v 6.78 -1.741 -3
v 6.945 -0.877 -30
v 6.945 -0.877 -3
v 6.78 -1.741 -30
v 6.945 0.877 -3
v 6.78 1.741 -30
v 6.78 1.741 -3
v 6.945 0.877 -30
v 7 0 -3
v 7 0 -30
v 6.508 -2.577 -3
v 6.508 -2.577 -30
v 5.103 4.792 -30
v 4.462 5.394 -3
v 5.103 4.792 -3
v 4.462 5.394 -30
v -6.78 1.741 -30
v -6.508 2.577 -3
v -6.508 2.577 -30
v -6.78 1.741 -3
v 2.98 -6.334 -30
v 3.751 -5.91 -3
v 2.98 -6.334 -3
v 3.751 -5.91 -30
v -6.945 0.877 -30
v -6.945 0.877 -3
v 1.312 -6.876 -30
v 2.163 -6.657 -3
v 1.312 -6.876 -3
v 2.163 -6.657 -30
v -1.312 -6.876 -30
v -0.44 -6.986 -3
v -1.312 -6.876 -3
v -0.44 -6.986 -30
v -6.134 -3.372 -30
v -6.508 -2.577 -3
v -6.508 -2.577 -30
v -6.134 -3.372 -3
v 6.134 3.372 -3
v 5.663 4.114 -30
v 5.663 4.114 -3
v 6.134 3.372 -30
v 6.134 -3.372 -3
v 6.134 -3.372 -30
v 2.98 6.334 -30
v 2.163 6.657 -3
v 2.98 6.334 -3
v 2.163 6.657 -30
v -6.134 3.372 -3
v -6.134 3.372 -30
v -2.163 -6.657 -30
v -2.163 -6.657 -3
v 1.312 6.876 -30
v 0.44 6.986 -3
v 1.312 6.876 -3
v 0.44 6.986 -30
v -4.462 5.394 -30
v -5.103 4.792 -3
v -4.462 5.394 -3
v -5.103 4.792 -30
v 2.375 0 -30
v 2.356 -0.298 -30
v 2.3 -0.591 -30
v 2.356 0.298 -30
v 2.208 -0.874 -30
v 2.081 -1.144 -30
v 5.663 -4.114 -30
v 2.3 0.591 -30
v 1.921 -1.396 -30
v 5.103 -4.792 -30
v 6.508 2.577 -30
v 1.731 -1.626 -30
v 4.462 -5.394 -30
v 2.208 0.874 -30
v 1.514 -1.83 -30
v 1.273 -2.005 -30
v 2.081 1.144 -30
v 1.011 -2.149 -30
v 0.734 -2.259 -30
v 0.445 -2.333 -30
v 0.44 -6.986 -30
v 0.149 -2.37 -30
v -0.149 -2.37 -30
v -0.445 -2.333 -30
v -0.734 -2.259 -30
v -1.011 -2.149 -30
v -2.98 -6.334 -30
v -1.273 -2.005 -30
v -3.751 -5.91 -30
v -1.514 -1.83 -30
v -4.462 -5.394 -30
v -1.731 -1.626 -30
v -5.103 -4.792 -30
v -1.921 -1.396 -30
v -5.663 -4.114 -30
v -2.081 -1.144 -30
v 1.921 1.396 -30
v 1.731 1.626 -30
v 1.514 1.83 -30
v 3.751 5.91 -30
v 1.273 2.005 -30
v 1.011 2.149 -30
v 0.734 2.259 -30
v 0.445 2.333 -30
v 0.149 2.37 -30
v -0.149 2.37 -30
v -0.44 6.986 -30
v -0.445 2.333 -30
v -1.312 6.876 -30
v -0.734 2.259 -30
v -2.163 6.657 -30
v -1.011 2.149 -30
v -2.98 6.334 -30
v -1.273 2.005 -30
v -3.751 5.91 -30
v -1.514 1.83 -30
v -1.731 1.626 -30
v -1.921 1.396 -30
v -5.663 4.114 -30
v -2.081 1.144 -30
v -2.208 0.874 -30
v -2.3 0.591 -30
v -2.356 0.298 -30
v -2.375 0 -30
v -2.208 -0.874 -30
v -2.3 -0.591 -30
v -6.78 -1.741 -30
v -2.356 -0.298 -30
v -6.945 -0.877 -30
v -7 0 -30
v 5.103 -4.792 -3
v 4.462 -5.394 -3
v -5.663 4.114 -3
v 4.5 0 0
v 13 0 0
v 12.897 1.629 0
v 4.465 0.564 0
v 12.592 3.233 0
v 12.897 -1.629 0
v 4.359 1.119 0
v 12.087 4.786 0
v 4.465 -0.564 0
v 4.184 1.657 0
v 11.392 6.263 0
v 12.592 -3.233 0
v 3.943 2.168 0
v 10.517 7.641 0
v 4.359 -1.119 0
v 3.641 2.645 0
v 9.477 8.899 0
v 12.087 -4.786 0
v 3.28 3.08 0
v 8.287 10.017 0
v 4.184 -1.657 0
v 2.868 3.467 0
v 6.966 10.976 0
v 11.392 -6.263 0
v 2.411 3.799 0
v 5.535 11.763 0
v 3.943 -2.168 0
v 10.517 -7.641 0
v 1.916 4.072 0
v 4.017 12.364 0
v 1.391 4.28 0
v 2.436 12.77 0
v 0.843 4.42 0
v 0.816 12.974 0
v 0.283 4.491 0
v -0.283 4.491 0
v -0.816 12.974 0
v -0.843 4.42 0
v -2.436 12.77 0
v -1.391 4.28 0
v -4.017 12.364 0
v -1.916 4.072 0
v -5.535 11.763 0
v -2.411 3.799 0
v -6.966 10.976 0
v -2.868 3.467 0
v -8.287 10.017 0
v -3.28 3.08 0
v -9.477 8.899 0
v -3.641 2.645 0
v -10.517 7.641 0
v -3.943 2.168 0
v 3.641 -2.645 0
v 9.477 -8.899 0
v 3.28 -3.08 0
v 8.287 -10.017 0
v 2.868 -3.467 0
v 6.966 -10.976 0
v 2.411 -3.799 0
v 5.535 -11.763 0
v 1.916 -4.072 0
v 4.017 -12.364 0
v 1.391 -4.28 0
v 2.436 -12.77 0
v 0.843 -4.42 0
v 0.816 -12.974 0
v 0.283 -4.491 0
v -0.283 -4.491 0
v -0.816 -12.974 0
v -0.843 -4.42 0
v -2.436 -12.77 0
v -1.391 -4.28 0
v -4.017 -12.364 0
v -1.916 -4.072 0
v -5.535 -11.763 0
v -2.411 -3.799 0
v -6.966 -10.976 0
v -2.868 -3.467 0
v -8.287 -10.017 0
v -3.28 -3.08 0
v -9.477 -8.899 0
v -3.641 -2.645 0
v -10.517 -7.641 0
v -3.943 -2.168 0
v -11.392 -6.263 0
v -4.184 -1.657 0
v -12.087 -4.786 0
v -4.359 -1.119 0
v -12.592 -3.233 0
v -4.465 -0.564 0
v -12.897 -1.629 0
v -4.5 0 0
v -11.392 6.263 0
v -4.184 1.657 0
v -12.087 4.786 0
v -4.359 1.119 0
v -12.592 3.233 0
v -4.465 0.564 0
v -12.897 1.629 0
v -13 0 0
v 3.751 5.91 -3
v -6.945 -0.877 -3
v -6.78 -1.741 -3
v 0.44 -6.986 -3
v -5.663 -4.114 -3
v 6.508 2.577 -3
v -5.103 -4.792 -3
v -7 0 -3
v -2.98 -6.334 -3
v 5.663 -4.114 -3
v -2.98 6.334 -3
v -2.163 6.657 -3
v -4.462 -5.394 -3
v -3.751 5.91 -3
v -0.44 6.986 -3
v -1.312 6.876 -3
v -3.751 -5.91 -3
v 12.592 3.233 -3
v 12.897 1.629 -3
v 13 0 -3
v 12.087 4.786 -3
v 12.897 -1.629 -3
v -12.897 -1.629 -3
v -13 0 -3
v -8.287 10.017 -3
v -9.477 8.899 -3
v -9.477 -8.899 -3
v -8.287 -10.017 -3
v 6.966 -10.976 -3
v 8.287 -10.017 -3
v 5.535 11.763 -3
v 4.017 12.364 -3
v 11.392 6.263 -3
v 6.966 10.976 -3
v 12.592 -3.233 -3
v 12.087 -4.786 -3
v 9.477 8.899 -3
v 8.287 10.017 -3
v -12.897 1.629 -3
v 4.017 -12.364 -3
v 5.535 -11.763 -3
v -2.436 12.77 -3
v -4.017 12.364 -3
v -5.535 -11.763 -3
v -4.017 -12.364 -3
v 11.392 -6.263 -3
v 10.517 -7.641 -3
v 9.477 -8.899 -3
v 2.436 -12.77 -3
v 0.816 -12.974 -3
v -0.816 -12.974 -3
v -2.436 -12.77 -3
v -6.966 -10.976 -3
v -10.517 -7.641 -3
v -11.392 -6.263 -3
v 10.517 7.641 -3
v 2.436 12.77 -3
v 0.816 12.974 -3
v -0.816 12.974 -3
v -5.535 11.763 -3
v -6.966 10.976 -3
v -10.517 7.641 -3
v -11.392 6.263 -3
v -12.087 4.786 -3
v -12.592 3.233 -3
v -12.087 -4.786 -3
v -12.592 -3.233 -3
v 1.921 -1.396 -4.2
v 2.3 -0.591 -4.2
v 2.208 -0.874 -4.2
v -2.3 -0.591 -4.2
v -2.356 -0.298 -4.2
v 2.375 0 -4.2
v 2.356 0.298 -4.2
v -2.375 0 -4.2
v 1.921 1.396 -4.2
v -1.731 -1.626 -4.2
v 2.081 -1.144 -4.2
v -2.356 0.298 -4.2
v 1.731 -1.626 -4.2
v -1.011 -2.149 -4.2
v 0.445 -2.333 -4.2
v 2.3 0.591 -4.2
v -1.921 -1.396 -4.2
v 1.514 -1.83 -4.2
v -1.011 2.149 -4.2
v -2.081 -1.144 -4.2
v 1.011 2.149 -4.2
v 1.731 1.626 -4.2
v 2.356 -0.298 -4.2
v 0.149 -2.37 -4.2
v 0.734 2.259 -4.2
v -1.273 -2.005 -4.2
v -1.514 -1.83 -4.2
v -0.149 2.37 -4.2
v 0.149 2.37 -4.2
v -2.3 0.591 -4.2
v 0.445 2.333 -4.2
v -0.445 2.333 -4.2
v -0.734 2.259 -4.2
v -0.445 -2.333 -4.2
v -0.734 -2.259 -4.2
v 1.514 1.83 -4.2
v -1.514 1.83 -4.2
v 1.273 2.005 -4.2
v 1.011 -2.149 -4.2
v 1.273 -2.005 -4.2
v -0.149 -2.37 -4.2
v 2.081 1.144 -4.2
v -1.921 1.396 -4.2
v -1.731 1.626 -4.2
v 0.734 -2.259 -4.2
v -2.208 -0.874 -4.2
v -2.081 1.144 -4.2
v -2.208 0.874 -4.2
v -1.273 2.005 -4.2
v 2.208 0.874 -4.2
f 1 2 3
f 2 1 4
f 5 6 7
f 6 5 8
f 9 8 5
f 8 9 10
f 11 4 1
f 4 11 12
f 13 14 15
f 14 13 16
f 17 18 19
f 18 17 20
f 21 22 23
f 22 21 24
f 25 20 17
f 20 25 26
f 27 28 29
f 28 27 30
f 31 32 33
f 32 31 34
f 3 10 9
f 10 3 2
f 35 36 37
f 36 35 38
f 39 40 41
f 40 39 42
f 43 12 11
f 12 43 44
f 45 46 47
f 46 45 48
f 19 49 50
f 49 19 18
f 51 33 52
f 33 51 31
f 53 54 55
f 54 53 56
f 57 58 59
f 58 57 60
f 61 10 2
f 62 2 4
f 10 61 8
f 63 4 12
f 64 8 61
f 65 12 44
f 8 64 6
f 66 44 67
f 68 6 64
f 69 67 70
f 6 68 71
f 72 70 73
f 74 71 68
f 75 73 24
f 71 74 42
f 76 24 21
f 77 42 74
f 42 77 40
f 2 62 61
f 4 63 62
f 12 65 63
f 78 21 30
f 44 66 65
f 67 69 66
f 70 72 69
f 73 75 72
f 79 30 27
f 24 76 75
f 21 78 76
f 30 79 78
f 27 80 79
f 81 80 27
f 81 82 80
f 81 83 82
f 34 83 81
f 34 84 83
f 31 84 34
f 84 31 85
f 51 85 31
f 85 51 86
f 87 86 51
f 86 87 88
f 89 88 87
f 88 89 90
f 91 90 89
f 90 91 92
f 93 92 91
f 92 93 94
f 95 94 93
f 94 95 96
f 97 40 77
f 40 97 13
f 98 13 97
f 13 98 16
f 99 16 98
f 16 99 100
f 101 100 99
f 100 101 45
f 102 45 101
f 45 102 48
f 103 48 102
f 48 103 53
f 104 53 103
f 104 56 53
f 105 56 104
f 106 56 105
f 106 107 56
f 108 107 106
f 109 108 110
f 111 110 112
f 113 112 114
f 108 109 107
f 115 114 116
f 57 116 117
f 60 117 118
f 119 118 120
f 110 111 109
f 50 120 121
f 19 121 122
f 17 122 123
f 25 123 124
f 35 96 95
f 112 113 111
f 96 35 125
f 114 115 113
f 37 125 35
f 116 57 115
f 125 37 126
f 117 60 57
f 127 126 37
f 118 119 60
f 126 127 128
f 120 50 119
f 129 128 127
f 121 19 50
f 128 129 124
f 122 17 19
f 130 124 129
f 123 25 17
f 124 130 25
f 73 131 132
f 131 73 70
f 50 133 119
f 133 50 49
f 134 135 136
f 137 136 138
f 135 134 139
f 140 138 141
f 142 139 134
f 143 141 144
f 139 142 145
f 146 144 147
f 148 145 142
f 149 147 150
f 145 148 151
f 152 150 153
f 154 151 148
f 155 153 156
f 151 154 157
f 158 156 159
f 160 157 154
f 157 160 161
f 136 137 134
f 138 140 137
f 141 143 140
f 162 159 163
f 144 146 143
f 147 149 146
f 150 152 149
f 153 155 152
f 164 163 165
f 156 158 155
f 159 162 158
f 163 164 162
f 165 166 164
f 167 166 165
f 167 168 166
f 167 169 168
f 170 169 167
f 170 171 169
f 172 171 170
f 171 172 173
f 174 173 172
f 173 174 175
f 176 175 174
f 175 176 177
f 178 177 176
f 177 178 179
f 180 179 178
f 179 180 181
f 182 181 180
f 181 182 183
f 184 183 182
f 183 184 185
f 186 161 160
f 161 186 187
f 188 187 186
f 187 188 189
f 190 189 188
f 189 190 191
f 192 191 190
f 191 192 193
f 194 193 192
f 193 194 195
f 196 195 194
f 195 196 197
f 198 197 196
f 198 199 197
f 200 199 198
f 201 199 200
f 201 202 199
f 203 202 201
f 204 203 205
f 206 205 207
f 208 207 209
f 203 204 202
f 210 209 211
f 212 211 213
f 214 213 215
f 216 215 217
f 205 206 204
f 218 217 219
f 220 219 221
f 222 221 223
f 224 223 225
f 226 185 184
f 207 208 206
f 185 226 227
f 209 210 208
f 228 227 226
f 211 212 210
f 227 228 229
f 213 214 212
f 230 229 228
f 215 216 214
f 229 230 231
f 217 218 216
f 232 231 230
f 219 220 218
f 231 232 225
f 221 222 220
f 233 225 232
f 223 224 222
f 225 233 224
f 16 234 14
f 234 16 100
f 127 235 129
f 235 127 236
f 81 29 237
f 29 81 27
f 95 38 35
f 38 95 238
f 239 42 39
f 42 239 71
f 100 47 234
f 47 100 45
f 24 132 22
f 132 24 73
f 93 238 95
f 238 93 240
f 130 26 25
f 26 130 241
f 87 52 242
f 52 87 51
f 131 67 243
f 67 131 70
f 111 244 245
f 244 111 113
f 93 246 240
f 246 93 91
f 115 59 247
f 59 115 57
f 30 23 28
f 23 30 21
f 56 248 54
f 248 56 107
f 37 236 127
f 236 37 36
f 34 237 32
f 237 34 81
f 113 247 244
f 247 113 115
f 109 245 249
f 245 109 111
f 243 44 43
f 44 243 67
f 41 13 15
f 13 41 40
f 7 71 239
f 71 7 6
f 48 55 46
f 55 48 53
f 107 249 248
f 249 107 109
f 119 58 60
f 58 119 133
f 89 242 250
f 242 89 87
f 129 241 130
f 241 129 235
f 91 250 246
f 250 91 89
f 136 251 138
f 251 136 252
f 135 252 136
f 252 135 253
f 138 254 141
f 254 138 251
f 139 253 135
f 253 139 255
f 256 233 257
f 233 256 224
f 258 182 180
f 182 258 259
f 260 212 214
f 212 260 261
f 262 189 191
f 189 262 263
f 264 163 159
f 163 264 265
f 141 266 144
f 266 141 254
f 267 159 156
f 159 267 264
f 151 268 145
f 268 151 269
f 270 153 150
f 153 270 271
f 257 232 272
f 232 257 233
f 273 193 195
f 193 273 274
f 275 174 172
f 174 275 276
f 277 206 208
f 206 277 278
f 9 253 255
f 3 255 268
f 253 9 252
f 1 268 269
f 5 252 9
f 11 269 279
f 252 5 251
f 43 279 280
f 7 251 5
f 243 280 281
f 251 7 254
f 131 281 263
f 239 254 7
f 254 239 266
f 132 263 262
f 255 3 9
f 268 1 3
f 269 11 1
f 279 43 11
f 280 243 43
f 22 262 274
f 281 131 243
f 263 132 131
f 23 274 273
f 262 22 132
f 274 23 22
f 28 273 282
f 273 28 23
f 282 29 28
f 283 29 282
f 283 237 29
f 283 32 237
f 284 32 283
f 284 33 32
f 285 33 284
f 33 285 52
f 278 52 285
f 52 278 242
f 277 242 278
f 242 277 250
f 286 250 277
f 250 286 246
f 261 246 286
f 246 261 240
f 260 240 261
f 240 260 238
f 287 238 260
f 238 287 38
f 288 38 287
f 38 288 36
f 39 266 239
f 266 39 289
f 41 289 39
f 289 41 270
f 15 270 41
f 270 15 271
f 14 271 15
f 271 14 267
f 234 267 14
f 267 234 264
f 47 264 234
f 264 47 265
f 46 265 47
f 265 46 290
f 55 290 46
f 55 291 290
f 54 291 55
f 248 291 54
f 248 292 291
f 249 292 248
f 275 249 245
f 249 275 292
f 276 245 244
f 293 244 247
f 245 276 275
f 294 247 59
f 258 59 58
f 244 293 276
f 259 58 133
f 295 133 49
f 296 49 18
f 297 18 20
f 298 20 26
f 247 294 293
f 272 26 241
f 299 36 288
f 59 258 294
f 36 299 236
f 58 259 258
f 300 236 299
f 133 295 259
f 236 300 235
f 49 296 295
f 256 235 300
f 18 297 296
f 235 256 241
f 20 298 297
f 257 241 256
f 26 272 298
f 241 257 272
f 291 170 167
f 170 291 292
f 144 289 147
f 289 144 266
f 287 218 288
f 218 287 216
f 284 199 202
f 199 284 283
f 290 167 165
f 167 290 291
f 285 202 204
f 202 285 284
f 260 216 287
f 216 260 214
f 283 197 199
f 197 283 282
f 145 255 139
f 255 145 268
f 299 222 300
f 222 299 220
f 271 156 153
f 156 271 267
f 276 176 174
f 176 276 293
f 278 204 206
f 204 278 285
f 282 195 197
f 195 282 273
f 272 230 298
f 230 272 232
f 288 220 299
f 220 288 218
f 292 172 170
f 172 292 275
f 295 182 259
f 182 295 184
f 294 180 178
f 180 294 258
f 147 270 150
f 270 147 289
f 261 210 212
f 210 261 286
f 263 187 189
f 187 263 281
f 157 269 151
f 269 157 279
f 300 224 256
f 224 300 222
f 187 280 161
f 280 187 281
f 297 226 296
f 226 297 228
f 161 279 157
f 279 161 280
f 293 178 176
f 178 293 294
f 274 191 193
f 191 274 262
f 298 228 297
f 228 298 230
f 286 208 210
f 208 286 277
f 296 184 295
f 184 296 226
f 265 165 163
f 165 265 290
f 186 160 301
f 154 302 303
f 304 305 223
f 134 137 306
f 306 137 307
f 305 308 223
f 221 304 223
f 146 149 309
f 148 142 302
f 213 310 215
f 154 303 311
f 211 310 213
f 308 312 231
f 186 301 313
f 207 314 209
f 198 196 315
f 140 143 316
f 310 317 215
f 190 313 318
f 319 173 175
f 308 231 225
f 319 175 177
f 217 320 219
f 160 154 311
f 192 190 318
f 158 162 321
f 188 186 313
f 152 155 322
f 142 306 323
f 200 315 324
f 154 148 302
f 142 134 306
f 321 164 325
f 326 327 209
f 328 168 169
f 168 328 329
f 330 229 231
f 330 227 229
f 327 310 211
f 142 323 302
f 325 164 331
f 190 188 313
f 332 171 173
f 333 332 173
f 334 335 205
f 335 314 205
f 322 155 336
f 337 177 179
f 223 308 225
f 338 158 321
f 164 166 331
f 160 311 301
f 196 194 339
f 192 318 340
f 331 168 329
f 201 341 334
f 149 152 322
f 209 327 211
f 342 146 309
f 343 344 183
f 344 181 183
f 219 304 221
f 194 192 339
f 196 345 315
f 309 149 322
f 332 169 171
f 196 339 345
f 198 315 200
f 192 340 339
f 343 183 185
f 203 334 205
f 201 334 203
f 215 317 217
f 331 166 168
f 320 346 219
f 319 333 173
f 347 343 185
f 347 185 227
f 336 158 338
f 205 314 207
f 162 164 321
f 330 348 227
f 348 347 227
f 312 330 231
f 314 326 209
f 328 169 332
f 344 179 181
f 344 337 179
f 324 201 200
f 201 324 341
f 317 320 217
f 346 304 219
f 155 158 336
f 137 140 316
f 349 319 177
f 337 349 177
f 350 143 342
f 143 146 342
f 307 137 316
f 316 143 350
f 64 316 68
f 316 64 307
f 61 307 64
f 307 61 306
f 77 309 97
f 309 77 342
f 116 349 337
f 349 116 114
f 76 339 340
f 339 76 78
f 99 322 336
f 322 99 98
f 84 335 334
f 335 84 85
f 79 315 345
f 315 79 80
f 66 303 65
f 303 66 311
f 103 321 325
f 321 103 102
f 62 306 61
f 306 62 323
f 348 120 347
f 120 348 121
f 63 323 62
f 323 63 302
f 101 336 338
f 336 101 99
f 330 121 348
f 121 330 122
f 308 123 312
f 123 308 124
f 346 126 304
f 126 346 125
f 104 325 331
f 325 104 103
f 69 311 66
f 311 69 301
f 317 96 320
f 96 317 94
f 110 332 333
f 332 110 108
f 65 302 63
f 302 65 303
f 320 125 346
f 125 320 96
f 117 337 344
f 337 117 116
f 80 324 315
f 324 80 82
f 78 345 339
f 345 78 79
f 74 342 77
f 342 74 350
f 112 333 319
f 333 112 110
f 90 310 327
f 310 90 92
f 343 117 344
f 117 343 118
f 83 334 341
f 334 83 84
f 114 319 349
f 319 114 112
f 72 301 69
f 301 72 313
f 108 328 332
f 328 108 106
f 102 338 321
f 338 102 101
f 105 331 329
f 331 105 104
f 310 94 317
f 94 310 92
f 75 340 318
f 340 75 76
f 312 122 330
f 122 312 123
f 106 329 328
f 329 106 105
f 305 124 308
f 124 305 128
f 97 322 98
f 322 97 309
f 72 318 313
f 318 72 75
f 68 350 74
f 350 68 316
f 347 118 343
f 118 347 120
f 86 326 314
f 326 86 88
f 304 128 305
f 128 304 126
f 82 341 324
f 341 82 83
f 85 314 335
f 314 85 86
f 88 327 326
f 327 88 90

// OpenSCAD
$fn = 50;


difference() {
	union() {
		translate(v = [0, 0, -30.0000000000]) {
			cylinder(h = 30, r = 7.0000000000);
		}
		translate(v = [0, 0, -3.0000000000]) {
			cylinder(h = 3, r = 13.0000000000);
		}
	}
	union() {
		translate(v = [0, 0, 0]) {
			rotate(a = [0, 0, 0]) {
				difference() {
					union() {
						#translate(v = [0, 0, -30.0000000000]) {
							cylinder(h = 30, r = 2.2500000000);
						}
						#translate(v = [0, 0, -4.2000000000]) {
							cylinder(h = 4.2000000000, r1 = 2.3750000000, r2 = 4.5000000000);
						}
						#translate(v = [0, 0, -30.0000000000]) {
							cylinder(h = 30, r = 2.3750000000);
						}
						#translate(v = [0, 0, -30.0000000000]) {
							cylinder(h = 30, r = 2.2500000000);
						}
					}
					union();
				}
			}
		}
	}
}
